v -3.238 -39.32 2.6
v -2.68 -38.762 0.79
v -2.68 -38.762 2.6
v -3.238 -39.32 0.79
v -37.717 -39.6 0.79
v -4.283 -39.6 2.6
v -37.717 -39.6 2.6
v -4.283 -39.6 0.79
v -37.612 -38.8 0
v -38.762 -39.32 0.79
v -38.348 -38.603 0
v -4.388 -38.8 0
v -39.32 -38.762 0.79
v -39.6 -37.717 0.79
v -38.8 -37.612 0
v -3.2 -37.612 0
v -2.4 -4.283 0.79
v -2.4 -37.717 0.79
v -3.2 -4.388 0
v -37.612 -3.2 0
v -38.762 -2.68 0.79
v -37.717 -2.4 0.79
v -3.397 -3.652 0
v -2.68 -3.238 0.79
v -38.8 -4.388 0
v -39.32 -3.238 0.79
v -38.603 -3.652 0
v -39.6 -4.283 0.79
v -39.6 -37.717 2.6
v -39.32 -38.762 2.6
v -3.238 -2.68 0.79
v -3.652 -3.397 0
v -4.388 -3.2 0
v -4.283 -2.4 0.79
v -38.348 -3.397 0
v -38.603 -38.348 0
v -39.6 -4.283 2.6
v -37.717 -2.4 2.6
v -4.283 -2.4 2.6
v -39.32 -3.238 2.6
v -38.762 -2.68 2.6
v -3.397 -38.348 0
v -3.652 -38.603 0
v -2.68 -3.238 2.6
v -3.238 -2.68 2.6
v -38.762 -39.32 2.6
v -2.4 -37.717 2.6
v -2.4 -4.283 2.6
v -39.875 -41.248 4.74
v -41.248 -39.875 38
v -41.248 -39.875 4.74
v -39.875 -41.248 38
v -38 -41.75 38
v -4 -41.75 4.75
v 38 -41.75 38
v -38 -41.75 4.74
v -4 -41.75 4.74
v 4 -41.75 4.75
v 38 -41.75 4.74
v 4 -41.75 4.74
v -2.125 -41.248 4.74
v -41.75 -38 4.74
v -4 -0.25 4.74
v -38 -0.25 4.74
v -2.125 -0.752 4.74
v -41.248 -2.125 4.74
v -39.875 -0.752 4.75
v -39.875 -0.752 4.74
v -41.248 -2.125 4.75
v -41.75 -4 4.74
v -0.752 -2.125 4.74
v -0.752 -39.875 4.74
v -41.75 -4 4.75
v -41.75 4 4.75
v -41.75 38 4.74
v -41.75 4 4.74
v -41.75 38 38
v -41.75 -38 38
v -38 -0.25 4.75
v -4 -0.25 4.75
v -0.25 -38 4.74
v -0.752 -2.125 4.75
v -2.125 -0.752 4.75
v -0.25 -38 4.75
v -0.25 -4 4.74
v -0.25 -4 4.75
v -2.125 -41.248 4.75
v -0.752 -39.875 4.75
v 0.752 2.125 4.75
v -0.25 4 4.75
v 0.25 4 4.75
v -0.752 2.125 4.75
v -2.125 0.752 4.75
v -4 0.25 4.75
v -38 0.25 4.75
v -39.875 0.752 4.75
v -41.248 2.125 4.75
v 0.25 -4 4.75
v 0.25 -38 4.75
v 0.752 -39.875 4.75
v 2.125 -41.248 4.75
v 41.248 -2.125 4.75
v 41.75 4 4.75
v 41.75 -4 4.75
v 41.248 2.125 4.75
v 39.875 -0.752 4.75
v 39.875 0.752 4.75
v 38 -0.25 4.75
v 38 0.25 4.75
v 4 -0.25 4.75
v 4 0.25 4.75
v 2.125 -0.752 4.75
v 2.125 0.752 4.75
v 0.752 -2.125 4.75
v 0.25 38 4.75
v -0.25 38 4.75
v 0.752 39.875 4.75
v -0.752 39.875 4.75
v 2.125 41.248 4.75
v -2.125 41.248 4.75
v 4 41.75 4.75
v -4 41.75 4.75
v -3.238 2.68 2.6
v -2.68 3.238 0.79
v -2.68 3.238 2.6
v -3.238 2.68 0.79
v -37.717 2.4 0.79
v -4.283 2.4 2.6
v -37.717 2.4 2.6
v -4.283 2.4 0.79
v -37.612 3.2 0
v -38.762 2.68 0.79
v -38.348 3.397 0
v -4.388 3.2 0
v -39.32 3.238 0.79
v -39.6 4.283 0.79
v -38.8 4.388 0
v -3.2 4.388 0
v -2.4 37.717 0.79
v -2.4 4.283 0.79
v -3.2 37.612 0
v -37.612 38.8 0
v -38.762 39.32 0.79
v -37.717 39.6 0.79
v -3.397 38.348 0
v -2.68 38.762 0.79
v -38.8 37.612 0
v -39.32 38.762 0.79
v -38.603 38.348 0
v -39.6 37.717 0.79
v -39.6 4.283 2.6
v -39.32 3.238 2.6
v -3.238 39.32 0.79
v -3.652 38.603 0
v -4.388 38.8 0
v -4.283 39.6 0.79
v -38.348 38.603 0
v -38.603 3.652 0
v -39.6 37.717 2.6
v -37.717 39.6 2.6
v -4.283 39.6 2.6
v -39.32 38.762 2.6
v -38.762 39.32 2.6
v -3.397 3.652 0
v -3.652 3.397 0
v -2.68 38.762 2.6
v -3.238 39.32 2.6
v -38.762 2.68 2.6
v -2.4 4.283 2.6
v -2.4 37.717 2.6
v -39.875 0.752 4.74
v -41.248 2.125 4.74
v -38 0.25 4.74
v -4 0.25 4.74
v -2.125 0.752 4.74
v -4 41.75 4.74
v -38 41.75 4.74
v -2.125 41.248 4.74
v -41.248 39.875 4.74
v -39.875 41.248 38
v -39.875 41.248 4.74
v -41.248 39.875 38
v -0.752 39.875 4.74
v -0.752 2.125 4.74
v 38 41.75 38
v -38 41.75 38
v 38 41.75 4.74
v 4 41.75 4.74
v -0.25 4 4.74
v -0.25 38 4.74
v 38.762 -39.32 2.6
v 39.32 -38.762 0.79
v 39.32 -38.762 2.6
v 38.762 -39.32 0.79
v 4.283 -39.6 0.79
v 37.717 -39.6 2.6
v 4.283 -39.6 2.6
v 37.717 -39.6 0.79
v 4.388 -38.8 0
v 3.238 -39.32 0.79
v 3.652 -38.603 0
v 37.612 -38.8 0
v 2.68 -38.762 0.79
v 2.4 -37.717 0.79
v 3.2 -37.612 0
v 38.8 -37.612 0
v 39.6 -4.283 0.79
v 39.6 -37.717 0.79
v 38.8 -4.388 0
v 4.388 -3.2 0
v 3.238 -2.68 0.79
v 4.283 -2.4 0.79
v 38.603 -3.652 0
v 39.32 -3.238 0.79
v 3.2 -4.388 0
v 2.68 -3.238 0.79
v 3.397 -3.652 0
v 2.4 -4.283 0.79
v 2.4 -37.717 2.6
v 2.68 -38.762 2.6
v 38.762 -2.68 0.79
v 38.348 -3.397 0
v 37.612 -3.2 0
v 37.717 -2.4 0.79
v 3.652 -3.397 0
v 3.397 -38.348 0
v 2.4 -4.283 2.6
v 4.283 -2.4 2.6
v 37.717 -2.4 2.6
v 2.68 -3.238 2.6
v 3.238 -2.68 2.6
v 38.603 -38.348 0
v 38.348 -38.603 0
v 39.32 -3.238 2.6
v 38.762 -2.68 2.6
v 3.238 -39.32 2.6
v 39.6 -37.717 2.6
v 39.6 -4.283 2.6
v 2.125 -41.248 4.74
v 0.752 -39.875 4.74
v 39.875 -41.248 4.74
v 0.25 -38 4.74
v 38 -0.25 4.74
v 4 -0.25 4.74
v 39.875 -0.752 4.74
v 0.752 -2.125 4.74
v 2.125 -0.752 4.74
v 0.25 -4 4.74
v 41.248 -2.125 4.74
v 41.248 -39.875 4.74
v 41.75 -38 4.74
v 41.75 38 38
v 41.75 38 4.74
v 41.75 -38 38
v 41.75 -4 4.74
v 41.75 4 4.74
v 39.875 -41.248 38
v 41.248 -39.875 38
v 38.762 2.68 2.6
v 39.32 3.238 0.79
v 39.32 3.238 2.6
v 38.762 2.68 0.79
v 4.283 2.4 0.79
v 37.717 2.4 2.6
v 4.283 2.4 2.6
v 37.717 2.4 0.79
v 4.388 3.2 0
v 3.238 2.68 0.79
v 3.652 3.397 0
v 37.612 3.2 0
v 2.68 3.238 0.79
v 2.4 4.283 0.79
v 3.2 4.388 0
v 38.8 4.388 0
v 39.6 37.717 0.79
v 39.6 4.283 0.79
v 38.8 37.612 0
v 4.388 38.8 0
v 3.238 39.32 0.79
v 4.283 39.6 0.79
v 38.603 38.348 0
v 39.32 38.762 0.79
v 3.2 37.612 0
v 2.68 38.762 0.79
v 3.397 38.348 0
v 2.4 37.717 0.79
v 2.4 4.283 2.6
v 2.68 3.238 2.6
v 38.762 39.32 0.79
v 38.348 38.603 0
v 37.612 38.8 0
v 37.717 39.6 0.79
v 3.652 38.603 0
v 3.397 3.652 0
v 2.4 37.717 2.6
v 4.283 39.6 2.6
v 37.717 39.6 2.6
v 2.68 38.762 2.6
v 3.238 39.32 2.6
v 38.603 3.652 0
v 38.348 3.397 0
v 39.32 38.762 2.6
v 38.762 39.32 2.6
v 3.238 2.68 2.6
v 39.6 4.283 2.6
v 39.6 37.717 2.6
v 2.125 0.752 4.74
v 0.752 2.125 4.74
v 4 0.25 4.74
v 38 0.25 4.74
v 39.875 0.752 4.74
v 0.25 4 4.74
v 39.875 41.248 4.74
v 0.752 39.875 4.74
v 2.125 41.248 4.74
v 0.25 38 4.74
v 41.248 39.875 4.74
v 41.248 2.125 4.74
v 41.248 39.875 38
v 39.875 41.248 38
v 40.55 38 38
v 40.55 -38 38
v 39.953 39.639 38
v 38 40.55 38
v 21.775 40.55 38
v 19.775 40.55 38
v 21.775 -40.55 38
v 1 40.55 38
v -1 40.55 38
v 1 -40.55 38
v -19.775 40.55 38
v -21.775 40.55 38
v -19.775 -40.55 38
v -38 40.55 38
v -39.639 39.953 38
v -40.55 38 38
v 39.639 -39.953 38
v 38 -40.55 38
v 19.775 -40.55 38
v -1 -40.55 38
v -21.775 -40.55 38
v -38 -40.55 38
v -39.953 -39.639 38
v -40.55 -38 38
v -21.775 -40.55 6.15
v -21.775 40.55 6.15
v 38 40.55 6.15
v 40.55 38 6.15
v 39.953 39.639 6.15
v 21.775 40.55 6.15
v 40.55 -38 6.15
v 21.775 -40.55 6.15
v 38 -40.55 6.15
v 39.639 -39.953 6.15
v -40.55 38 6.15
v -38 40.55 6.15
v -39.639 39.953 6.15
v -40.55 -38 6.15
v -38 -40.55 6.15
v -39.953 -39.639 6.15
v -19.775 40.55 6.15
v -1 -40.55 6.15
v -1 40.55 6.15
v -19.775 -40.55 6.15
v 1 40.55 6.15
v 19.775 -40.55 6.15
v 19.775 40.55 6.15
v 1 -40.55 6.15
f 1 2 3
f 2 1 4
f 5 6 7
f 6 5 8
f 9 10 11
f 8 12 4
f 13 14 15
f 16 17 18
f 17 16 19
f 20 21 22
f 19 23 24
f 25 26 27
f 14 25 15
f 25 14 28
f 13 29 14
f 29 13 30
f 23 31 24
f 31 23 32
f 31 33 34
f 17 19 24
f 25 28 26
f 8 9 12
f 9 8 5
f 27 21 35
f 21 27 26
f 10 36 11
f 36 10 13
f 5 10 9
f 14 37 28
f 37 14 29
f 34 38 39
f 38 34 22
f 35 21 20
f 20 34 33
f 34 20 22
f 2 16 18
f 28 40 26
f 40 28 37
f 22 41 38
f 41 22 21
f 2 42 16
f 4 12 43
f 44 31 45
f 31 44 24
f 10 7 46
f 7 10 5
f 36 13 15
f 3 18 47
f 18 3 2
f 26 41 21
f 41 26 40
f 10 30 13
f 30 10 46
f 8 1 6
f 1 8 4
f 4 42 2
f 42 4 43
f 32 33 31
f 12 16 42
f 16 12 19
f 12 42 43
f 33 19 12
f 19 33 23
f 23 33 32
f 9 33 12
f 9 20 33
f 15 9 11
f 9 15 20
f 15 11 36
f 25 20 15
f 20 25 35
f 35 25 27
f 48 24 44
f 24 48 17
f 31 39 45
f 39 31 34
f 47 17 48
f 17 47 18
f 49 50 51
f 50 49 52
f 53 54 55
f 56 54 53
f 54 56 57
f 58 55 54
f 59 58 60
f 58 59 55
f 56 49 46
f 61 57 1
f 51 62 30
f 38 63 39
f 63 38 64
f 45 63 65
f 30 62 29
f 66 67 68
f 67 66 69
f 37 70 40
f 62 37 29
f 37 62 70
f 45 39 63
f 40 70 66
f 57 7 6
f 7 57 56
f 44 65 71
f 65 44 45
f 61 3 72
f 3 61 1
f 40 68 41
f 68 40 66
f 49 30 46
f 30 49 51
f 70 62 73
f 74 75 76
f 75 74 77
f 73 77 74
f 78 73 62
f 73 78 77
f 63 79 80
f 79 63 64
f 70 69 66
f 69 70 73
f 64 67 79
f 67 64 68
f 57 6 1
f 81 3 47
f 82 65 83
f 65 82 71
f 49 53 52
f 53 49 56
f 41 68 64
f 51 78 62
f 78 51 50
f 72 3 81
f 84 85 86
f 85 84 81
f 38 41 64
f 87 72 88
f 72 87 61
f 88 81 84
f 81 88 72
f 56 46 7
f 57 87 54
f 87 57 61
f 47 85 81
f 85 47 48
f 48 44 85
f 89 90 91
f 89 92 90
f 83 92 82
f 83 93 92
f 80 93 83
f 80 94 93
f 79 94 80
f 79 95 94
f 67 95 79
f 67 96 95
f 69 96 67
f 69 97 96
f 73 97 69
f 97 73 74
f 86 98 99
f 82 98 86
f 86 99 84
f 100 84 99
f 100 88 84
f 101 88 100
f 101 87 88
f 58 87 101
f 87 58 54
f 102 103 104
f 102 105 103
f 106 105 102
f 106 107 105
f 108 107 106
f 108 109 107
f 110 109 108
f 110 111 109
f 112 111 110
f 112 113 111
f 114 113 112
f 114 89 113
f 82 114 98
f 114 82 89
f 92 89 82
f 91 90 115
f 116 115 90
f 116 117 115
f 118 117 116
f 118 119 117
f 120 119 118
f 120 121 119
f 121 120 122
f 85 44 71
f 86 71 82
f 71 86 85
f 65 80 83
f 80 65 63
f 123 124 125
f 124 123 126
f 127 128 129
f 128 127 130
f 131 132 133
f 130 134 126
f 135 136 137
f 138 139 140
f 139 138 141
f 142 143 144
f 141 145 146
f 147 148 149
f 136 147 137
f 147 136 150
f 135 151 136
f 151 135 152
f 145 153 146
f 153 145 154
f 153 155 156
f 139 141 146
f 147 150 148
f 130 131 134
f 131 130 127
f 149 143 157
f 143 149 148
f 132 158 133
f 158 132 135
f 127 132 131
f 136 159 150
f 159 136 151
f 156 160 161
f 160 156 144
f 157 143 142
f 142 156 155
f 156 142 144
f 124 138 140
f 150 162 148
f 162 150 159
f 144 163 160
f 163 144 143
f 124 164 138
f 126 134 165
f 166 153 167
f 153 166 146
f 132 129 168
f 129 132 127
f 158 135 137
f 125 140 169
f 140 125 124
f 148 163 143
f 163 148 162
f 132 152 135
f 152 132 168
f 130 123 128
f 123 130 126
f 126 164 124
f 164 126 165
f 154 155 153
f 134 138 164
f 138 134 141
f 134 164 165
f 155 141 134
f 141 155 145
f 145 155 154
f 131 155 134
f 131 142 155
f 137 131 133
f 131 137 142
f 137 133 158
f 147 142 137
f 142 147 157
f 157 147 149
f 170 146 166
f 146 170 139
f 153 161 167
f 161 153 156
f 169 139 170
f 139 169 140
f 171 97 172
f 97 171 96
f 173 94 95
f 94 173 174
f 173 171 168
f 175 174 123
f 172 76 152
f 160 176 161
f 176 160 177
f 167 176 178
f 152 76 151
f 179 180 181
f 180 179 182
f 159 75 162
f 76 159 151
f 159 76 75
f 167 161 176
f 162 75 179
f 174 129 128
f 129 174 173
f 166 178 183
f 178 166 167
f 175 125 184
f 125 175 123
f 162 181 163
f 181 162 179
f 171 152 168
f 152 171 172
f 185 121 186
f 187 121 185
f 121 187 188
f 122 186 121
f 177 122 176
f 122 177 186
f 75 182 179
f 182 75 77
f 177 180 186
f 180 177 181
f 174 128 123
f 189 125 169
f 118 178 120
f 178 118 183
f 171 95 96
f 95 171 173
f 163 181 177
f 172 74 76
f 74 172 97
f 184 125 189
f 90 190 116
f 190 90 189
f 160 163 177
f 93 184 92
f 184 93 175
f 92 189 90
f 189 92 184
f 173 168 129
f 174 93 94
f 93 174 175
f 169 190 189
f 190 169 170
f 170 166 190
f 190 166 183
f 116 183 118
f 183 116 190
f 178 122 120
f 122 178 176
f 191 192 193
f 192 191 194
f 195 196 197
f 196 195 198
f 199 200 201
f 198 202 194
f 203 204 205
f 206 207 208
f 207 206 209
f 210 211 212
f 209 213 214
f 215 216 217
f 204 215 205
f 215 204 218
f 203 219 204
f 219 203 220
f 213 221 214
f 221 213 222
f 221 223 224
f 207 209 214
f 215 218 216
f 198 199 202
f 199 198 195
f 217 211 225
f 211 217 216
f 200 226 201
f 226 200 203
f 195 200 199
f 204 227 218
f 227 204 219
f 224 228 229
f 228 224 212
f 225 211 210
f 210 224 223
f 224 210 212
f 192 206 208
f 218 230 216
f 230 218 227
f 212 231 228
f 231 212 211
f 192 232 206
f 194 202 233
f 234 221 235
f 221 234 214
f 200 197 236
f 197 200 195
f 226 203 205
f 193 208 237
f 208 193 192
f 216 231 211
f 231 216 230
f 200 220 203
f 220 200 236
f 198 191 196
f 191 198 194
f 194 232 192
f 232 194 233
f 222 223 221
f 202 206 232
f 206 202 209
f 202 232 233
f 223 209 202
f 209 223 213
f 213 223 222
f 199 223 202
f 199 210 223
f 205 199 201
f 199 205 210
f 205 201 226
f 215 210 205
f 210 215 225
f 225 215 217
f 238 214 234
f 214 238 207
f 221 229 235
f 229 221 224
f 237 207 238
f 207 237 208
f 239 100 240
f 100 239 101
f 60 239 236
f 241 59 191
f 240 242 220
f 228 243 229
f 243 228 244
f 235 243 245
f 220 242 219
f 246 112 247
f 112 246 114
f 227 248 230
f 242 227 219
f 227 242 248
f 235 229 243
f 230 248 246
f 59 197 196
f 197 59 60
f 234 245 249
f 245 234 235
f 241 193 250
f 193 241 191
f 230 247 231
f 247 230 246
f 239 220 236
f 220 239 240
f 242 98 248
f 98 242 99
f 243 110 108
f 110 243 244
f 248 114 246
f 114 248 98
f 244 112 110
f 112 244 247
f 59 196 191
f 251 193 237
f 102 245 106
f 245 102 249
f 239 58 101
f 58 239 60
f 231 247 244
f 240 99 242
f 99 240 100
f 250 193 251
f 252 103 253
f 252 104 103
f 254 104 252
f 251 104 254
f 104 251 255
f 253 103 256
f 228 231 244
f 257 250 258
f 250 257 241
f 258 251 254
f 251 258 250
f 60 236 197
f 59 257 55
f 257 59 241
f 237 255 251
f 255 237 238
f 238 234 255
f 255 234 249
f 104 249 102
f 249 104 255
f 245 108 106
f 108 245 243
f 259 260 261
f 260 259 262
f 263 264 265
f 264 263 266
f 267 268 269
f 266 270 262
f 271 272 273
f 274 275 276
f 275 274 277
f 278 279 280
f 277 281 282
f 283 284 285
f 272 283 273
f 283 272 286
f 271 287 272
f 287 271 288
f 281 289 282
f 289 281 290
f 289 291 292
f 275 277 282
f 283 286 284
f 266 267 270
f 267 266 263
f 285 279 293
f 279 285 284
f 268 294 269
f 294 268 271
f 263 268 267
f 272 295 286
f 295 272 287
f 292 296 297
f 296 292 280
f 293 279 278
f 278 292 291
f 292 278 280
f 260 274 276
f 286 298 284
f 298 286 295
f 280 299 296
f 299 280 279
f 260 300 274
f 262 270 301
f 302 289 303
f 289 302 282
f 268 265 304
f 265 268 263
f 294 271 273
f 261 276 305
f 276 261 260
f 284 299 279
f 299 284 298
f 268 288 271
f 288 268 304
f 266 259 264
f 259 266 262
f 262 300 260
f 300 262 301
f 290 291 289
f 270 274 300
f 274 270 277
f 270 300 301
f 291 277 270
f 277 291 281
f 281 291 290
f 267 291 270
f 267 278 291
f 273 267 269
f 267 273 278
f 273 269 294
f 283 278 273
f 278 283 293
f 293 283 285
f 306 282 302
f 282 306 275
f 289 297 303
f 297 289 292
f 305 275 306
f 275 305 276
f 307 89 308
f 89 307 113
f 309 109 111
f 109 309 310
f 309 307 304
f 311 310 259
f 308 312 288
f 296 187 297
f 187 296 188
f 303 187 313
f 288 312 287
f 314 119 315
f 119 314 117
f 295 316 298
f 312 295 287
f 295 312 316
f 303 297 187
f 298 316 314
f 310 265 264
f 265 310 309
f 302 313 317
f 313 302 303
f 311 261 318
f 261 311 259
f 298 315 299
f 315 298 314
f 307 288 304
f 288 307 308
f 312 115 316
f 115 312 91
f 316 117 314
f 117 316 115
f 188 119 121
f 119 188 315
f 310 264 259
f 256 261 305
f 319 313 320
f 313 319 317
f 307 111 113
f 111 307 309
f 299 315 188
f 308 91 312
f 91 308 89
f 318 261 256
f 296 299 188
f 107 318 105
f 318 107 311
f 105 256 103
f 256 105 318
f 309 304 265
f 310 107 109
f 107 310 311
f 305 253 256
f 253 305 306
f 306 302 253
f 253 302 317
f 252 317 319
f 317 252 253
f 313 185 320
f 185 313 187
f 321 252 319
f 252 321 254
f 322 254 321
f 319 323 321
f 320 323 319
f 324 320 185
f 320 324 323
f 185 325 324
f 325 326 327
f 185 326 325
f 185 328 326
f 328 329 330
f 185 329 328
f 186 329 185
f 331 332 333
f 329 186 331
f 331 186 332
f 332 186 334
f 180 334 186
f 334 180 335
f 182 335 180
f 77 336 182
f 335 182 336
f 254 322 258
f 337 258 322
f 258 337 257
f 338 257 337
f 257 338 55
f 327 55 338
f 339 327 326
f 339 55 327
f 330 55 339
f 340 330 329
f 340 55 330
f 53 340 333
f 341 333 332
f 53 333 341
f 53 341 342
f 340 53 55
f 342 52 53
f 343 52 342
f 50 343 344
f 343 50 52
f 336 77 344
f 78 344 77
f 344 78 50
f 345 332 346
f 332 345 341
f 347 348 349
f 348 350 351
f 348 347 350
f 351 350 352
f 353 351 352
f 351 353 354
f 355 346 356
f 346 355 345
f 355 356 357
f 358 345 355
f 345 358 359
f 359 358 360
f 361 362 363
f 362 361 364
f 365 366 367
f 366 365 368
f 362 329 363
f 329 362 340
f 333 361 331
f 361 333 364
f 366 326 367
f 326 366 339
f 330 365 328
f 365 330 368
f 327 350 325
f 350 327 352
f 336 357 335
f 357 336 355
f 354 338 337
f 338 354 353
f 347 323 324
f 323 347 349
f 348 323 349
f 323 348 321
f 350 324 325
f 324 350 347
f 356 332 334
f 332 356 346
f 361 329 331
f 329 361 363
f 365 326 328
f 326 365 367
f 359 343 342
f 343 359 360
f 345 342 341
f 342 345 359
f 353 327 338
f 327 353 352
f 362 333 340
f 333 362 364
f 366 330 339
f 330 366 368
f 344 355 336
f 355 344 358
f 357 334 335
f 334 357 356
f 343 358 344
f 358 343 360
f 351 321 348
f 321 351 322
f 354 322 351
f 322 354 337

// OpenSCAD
// bin_stencil_bucket — 2×2 bin, four bays, for the BAGGED stencil packs standing
// on edge.
//
// HOW YOU USE IT:
//   Four bays, one per ball size, bags filed on edge like records. You flip to
//   the size you want and lift the bag out. The bags stand proud of the rim, so
//   there is always something to pinch.
//
// WHY THIS EXISTS SEPARATELY FROM bin_bga_rack. The rack's slots are 7.78 mm and
// the largest bagged pack is over 12.7 — less than two thirds of what it needs,
// which is why the packs never fitted. The rack is NOT being redesigned: it
// keeps the jig and takes the flat, thin things (iPhone-sized stencils, trace
// repair sheets, paste scrapers, the two 1"×1" glass plates in their bags). The
// bulky bagged packs come here.
//
// THE BAG SIZE IS NOT A TIGHT DIMENSION, AND THAT IS THE POINT. The largest bare
// stencil is 50 × 50, so its bag is somewhere above 50 and nowhere near the
// 81.1 mm a 2-wide interior gives. A bucket does not need to trace its contents
// — it needs to swallow them and keep them sorted. Nothing here is cut to a
// number nobody measured; the bay depth is simply the whole interior.
//
// HEIGHT IS A GRAB ALLOWANCE, NOT CAPACITY. At 38 mm a bag holding a 50 mm
// stencil stands at least ~15 mm proud. Burying it would need a taller bin for
// no gain and would make the bags harder to get out, which is the same reasoning
// the rack's slots were built on.
//
// GROWTH IS A SECOND BUCKET, NOT A BIGGER ONE. The collection is expected to
// keep growing. A 2×2 latches anywhere on the grid, so another print gives four
// more bays alongside — which beats guessing today how big the collection gets.
// N_BAY is parametric if you would rather subdivide further.
//
// PRINT: as emitted, feet down. No supports.
//
// SPDX-License-Identifier: CC-BY-NC-4.0
// Copyright (c) 2026 Aaron Cupp
include <../lib/gridfinity.scad>

/* [Contents] */
STENCIL_W = 50.0;   // largest bare stencil, measured — the bag is bigger than this
N_BAY     = 4;      // [2:1:8] one bay per ball size; there are four bags

/* [Bin] */
NX = 2; NY = 2;
DEPTH  = 38 - BIN_BASE_H - 1.4;   // usable depth; see HEIGHT note above
WALL   = 1.2;
DIV    = 2.0;       // [1.2:0.2:4] divider between bays
FLOOR  = 1.4;

BUCKET_H = BIN_BASE_H + FLOOR + DEPTH;

W  = NX*GF - 0.5;  D = NY*GF - 0.5;
IW = W - 2*WALL;   ID = D - 2*WALL;
Z0 = BIN_BASE_H + FLOOR;

BAY = (IW - (N_BAY - 1)*DIV) / N_BAY;

assert(BAY >= 12.7 + 1.0,
       str("Bays are ", BAY, " mm — the largest pack is over 12.7 thick and will not go in."));
assert(ID > STENCIL_W + 4,
       str("A ", STENCIL_W, " mm stencil's bag will not lie in a ", ID, " mm bay."));
assert(BUCKET_H < STENCIL_W - 8,
       "Bin is too tall — the bags would sit flush or buried with nothing to grab.");
echo(str(N_BAY, " bays of ", BAY, " mm across ", IW, "; bay depth ", ID,
         "; rim at ", BUCKET_H, " so a ", STENCIL_W, " mm stencil stands ",
         STENCIL_W - BUCKET_H, "+ mm proud"));


// THE CUTS MUST BE CLIPPED TO THE ROUNDED INTERIOR.
//
// bin_blank's interior is a ROUNDED rectangle (radius BIN_R - WALL). A plain
// cube spanning the full IW x ID runs straight through those corner radii and
// opens all four corners — the bin comes off the printer with no connected
// corners at all.
//
// It renders. It is watertight, 2-manifold, the right bounding box, and every
// zone measures exactly right. tools/validate_stl.py PASSES it. The only thing
// wrong is that the box is not a box, and nothing in the toolchain can see that.
// This shipped and was printed before anyone noticed.
//
// Clip first, then cut. Same fix as bin_swabs.
module _interior() {
    translate([0, 0, Z0]) linear_extrude(DEPTH + 0.2)
        offset(BIN_R - WALL) offset(-(BIN_R - WALL))
            square([IW, ID], center = true);
}

difference() {
    bin_blank(NX, NY, BUCKET_H);
    intersection() {
        union() {
            for (i = [0 : N_BAY - 1])
                translate([-IW/2 + i*(BAY + DIV), -ID/2, Z0])
                    cube([BAY, ID, DEPTH + 0.1]);
        }
        _interior();
    }
}
